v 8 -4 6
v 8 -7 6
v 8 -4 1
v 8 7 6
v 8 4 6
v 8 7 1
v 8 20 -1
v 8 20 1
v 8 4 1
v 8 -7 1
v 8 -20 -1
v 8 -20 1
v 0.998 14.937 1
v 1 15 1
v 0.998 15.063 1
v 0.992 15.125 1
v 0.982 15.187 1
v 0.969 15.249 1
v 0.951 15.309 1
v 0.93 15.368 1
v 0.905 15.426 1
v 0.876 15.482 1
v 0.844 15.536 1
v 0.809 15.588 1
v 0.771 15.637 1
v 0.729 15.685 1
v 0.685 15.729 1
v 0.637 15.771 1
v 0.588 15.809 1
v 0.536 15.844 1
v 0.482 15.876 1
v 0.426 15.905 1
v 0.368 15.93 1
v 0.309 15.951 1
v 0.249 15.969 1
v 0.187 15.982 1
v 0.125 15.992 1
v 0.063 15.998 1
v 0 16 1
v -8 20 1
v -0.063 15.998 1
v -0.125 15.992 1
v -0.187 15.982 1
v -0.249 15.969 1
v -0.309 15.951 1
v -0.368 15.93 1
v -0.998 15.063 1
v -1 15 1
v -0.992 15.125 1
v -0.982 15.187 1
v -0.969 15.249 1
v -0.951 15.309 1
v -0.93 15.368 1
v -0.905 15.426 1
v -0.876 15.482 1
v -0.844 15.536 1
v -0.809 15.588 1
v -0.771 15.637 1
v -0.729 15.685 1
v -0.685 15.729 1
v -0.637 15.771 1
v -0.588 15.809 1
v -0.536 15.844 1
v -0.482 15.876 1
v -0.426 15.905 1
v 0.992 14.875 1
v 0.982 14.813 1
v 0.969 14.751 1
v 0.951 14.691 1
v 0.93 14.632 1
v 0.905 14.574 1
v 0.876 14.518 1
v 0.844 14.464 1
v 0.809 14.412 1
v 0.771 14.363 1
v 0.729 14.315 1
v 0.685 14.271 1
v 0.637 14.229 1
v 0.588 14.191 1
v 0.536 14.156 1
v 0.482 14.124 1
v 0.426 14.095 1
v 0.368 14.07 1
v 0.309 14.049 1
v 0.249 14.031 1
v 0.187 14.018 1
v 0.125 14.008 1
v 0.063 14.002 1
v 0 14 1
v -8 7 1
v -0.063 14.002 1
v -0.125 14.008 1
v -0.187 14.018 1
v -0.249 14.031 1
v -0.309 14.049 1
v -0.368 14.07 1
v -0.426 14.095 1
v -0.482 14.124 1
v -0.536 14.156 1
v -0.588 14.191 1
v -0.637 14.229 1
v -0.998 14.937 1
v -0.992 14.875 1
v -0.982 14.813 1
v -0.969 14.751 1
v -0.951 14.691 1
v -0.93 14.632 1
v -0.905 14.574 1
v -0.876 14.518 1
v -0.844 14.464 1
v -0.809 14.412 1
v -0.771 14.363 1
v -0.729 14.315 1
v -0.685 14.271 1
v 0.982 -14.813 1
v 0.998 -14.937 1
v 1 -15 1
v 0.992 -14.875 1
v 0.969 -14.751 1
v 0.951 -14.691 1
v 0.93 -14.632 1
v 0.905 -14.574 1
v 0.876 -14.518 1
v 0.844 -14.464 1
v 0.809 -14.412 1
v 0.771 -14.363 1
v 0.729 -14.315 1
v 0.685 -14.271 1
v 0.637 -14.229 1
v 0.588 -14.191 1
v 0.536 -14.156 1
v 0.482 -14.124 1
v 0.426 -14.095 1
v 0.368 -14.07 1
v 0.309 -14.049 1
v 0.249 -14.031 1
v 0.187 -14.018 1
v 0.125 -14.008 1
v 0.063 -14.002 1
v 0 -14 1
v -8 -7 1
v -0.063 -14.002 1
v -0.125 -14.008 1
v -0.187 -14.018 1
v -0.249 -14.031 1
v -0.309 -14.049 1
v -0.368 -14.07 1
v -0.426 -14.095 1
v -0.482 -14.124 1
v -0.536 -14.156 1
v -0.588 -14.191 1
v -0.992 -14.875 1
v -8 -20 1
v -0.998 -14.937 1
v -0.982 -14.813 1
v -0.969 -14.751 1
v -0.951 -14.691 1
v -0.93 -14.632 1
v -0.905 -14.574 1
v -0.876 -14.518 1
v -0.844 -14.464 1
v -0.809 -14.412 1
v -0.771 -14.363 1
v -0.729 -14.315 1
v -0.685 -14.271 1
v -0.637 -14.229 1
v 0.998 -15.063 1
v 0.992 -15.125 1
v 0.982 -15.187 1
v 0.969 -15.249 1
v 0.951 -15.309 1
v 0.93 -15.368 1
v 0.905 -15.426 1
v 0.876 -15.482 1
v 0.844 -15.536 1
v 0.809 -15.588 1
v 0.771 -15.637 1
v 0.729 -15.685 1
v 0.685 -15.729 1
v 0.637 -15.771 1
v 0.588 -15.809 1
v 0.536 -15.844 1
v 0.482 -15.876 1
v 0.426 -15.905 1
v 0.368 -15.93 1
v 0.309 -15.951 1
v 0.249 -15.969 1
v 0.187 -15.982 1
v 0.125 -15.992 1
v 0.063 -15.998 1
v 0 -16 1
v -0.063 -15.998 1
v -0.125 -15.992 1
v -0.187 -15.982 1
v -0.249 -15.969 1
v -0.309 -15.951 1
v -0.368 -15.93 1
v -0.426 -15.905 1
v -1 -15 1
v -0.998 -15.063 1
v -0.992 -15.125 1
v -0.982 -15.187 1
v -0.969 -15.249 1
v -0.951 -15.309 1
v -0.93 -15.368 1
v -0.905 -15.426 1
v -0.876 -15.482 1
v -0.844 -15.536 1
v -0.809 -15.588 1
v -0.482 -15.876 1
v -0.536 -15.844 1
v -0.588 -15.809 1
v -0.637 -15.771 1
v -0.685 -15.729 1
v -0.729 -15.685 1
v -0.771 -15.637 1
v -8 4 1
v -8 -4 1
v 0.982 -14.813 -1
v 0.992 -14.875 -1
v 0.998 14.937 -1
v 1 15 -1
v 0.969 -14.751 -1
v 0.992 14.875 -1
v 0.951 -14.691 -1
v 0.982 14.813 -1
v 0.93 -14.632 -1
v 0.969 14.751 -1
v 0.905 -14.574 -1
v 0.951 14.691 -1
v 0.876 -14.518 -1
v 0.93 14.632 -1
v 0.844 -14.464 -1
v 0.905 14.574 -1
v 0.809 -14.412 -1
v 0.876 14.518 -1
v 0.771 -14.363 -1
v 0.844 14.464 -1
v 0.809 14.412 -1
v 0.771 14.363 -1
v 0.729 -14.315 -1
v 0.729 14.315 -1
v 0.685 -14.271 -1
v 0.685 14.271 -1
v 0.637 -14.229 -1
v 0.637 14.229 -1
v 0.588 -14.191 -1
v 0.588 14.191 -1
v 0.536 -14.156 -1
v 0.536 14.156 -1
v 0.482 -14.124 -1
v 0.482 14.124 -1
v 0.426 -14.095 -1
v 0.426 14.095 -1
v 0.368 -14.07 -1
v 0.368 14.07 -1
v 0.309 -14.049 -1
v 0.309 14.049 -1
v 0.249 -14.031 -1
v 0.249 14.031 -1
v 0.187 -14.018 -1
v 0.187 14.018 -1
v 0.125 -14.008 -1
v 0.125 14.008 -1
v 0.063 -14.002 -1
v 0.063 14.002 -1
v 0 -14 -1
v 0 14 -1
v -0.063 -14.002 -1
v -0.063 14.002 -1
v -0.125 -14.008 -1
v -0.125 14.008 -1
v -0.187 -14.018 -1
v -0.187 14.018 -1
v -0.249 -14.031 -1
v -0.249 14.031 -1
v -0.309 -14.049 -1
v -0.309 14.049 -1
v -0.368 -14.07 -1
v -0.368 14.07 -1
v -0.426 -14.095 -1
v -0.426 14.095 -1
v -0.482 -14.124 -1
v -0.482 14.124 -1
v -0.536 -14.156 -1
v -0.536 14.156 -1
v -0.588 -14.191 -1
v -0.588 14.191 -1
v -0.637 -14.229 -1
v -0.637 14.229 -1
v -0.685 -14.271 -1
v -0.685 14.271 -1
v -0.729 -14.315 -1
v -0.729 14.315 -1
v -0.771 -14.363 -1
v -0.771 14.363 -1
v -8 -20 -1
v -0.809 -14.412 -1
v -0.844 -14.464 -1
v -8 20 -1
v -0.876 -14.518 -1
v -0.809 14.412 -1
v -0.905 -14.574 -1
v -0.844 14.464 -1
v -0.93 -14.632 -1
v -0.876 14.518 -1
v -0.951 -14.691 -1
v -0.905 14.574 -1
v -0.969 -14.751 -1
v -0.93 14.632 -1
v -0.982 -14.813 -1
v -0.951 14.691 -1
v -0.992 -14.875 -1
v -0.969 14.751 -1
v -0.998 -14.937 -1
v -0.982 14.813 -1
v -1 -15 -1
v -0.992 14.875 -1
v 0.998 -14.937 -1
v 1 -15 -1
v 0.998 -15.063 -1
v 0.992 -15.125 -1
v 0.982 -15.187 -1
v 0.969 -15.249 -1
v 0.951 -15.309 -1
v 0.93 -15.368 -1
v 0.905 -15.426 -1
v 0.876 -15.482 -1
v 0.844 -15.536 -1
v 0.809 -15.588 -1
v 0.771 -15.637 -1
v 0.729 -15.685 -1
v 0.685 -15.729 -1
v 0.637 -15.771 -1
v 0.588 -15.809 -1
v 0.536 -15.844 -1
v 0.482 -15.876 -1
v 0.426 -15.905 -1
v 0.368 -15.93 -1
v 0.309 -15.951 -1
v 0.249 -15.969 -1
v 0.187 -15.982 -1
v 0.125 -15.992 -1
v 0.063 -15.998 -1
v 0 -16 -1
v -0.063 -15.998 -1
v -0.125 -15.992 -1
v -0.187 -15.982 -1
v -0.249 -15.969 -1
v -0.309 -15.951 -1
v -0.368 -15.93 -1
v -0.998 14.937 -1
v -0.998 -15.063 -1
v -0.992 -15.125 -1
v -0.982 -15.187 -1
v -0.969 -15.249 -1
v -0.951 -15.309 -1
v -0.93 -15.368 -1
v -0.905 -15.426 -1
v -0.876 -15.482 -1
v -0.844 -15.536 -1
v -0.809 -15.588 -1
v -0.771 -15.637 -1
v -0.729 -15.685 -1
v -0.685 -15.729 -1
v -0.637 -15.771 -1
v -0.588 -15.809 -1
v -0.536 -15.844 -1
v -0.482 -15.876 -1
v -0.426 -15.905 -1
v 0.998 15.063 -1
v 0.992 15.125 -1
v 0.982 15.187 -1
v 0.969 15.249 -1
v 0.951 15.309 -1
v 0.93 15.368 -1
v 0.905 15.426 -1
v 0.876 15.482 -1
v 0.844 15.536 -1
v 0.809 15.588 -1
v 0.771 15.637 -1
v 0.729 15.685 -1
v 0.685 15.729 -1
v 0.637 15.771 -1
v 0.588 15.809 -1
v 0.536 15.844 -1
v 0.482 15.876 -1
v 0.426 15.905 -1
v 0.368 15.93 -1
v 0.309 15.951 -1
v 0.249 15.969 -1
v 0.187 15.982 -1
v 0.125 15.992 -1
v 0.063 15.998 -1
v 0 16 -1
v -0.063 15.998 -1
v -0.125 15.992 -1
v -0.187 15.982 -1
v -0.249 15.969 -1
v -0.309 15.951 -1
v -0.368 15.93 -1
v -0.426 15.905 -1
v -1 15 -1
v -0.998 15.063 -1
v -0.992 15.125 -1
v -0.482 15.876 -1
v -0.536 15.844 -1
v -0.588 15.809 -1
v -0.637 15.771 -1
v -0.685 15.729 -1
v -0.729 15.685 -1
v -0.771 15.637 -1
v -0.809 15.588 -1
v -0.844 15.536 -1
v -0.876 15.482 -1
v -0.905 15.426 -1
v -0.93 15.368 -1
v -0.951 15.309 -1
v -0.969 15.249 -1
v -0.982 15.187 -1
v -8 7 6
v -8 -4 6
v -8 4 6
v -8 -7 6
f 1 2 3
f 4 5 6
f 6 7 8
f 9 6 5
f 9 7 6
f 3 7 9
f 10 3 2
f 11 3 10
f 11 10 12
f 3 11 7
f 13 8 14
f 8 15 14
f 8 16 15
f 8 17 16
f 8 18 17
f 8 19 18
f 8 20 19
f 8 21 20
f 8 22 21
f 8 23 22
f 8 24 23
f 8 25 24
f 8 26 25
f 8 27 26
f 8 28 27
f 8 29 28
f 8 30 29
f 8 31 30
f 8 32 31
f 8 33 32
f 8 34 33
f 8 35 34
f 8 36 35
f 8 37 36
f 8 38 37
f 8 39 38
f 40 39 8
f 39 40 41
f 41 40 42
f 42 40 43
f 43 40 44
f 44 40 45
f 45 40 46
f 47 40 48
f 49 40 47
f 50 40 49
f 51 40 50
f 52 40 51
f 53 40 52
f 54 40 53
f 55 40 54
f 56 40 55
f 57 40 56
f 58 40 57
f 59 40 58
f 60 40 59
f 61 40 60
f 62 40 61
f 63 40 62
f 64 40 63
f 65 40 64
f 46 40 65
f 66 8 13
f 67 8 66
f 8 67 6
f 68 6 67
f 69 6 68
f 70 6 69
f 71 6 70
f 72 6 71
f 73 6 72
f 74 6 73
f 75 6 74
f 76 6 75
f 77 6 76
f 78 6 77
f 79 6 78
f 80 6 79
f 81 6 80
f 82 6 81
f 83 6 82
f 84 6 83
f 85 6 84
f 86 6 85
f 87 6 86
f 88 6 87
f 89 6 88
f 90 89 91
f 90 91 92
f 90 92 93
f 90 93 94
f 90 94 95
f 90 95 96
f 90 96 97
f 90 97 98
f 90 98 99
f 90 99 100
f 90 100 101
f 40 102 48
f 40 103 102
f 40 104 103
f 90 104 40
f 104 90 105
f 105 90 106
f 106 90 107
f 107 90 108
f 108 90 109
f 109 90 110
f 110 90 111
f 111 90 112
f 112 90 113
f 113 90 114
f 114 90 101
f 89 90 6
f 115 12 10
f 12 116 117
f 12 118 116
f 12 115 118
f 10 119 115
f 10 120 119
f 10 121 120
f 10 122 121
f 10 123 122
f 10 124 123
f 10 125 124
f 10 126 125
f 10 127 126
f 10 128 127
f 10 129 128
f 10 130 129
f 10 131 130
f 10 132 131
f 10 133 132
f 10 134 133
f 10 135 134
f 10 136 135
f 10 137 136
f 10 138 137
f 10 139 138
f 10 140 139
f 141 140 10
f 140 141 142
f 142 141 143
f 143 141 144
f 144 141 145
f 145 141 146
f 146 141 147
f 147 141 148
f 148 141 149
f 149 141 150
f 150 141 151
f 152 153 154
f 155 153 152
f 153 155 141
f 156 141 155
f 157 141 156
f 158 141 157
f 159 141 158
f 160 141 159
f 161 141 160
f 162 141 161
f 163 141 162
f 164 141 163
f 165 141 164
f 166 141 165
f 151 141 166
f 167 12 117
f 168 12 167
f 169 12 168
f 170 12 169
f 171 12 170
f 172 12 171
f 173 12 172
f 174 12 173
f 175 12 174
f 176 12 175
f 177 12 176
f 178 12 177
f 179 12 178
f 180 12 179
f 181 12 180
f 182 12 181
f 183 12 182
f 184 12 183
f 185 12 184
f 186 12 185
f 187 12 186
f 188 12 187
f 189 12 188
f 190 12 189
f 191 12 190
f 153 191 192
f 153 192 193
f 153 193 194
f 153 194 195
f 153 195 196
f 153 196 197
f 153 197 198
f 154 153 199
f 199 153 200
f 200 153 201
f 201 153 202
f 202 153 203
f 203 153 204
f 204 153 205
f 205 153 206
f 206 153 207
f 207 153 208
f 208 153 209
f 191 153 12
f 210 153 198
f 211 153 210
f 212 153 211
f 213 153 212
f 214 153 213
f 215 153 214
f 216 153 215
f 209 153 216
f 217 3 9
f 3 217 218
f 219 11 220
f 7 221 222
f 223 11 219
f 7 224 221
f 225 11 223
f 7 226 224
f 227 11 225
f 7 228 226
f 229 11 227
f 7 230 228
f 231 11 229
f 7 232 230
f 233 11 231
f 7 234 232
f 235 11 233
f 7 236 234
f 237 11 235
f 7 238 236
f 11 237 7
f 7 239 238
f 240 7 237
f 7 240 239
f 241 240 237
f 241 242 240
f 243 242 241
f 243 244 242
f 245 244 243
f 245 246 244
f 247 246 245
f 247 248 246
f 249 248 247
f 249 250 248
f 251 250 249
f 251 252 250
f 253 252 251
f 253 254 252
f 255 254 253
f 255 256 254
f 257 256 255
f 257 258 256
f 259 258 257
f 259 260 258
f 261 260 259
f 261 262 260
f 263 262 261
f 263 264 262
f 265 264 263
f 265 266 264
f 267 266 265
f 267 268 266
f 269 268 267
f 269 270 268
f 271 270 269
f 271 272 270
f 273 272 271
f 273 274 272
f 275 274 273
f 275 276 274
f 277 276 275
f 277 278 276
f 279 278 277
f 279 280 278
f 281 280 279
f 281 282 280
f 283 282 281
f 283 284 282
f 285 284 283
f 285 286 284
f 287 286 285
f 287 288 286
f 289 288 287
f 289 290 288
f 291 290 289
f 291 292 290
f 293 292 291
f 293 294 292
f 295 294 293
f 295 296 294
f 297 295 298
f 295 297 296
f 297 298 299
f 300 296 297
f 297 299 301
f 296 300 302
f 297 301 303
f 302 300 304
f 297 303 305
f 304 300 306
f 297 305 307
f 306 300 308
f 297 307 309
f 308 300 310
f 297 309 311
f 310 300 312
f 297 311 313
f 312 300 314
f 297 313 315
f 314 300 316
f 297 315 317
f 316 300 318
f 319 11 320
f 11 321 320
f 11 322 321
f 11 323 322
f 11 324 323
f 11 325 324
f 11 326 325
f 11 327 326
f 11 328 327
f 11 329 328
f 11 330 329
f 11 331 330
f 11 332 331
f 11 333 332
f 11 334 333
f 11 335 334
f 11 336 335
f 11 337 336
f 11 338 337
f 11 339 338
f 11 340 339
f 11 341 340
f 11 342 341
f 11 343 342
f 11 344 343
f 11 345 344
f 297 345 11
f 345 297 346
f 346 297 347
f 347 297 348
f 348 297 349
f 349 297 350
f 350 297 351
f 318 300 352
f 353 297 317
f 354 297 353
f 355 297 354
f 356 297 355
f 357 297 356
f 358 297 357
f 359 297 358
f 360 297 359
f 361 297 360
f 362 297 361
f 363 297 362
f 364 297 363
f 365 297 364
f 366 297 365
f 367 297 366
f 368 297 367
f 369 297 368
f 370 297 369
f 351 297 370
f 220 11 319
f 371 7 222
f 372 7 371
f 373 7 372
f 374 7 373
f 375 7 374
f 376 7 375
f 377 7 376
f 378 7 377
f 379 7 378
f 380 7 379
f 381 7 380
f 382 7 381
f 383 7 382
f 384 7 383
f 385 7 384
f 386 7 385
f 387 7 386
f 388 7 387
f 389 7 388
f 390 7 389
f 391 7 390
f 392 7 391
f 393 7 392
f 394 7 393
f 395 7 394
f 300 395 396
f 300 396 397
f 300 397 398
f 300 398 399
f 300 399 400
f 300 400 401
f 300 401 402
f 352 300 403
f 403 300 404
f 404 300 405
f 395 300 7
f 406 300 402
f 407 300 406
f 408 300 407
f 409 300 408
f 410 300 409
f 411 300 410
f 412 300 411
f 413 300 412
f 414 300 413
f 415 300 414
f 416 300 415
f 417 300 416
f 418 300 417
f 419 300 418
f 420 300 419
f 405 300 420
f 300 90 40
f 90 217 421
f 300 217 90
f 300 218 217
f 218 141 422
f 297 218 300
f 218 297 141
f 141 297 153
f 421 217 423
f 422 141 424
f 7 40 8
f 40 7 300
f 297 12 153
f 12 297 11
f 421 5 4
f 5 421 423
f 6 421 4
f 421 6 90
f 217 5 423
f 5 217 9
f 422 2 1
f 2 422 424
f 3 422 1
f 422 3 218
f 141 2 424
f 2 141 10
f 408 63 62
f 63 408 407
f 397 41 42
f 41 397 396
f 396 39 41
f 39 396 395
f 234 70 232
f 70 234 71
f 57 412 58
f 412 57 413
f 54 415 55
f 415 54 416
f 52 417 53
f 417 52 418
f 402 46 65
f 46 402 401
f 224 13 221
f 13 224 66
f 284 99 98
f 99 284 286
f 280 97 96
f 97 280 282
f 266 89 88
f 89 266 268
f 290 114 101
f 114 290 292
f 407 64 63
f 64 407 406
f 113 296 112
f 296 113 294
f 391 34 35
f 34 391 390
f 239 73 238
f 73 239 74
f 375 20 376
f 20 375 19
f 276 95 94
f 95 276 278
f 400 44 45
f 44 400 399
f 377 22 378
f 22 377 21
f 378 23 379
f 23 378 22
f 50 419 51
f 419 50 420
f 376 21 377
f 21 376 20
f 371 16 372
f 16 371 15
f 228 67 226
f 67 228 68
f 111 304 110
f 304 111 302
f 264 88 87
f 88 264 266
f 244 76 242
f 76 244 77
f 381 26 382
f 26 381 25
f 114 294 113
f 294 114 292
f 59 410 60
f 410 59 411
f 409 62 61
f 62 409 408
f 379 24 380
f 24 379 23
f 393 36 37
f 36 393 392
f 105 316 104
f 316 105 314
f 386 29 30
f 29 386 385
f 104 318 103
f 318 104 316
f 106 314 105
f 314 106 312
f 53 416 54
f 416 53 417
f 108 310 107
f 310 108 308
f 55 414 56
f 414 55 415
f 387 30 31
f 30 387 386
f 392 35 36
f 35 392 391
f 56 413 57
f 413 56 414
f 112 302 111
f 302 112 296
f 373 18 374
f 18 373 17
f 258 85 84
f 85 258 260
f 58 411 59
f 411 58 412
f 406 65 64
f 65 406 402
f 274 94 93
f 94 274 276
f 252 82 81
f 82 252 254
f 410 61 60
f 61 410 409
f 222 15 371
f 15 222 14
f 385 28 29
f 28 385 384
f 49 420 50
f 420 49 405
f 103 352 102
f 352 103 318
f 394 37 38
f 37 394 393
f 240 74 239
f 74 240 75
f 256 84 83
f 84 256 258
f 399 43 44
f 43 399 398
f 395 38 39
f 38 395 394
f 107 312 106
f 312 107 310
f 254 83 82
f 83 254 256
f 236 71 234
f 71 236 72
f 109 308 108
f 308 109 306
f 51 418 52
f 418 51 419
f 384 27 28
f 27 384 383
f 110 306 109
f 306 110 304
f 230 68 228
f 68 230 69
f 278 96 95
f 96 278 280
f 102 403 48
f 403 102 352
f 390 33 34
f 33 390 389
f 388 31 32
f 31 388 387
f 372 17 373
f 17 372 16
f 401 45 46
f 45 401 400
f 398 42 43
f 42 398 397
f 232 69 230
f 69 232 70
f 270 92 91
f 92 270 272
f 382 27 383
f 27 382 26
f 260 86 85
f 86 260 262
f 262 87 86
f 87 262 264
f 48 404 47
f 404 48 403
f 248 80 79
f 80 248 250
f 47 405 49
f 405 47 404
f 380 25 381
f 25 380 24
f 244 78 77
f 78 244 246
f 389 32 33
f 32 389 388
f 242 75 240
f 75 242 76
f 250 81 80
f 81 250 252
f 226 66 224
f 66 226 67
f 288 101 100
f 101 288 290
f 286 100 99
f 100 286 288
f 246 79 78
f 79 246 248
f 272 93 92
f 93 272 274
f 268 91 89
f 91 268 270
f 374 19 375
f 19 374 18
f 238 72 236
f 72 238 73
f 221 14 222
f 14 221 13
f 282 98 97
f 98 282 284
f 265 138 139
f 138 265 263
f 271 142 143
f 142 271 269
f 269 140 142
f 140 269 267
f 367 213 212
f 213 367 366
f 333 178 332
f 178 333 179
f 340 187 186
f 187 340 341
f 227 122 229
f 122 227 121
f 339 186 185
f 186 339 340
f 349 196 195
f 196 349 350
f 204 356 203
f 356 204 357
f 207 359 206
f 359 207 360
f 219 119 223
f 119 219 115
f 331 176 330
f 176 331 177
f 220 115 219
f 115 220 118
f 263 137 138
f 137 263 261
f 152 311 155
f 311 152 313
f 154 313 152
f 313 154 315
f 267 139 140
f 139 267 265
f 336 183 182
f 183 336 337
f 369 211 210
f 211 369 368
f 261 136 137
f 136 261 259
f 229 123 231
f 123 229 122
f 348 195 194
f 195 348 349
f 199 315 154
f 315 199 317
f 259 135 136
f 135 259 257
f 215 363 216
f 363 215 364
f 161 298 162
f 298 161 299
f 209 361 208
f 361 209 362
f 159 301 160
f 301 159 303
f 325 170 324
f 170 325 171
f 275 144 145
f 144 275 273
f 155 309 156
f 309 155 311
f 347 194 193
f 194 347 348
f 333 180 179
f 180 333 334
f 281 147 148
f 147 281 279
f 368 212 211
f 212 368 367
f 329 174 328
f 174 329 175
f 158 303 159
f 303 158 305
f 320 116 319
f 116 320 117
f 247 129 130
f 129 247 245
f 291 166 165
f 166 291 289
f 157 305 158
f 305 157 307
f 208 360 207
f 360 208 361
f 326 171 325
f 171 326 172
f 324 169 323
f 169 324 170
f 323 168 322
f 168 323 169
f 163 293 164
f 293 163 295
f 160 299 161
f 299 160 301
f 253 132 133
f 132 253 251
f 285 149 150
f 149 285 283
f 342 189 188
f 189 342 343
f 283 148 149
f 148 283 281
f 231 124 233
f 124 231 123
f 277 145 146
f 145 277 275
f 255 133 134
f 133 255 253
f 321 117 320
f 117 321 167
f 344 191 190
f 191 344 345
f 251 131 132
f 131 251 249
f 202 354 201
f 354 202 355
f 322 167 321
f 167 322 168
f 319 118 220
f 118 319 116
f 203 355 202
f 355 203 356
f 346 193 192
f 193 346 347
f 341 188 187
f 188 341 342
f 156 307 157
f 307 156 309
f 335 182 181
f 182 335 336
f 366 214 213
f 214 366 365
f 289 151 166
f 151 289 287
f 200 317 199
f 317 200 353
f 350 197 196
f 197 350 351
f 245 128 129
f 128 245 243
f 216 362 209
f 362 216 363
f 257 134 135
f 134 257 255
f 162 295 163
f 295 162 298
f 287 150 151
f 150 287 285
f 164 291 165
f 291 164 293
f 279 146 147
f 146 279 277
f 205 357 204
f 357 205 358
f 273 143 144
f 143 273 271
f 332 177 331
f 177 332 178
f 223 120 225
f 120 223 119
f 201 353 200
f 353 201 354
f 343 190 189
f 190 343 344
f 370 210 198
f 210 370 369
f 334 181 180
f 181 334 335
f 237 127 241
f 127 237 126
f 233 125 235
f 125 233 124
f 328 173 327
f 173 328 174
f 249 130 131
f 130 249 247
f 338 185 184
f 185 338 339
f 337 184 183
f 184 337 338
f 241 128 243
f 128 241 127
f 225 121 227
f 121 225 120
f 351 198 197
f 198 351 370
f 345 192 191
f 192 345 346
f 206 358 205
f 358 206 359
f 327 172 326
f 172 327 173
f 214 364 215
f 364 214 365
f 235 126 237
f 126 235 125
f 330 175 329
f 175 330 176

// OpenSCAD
difference(){
	union(){
        
       translate([0,0,0]){
           cube([16,40,2], center=true);
       }
        translate([0,5.5,3]){
           cube([16,3,6], center=true);
       }
        translate([0,-5.5,3]){
           cube([16,3,6], center=true);
       }

	}
	union() {
        
       translate([0,15,0]){
            rotate(a = [0,0,90]) {
              cylinder(h=600, r=1, $fn=100, center=true);
            }
       }			   
       translate([0,-15,0]){
            rotate(a = [0,0,90]) {
              cylinder(h=600, r=1, $fn=100, center=true);
            }
       }			   
		   

        
	}
}
